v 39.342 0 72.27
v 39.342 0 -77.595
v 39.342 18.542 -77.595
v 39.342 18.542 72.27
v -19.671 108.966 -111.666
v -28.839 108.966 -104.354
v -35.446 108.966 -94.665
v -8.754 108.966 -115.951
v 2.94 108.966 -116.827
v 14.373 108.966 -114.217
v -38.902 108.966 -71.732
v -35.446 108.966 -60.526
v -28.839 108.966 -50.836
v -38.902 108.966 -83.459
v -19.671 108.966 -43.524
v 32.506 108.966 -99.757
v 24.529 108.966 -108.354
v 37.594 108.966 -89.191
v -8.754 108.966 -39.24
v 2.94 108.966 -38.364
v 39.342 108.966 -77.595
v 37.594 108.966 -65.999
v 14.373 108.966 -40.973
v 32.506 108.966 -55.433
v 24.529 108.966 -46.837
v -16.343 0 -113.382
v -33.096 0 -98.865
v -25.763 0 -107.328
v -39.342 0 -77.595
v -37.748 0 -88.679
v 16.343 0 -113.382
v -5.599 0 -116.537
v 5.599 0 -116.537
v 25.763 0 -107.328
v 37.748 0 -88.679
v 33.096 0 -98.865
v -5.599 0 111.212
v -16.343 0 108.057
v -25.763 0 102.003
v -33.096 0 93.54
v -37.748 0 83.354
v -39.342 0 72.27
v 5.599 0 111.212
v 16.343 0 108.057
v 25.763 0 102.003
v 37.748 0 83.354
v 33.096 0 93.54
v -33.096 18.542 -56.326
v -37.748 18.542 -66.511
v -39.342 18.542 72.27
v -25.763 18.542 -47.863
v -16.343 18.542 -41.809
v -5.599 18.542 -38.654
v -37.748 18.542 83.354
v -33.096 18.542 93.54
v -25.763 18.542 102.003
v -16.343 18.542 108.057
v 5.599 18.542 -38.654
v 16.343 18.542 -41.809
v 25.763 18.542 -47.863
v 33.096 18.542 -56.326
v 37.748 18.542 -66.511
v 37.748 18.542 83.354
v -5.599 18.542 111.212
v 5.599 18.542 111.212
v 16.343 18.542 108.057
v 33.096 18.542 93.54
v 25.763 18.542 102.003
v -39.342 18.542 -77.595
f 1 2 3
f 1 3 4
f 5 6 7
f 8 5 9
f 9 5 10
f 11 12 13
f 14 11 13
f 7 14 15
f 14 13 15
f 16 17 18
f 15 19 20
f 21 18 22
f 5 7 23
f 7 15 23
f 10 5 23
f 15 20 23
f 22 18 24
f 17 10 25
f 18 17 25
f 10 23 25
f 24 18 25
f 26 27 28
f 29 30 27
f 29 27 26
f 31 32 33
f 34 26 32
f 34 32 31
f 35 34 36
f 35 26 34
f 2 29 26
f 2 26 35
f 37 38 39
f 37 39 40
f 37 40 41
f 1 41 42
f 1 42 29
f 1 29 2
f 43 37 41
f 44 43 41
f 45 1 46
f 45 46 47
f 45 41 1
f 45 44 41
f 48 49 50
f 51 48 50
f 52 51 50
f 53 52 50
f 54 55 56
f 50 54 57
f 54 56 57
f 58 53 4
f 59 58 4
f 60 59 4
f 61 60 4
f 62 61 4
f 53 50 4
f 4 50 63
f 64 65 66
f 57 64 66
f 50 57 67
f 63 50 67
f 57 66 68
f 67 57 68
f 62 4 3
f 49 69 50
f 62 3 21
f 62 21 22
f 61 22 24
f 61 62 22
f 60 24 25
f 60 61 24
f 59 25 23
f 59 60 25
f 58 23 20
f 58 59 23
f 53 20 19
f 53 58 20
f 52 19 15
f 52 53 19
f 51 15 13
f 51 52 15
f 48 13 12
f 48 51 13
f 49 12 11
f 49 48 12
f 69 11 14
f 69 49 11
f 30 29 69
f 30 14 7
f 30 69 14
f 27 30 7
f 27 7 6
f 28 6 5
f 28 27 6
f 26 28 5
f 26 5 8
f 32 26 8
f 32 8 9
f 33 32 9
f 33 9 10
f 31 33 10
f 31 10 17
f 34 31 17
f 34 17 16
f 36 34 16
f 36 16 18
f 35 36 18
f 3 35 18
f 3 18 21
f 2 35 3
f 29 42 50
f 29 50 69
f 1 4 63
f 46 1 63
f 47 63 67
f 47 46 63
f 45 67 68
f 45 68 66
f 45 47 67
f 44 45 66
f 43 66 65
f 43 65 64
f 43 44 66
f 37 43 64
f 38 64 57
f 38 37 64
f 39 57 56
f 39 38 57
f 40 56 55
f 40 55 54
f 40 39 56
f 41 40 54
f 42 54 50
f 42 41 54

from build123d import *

# Parameters (mm, degrees)
F1_DEPTH = 108.966
F2_DEPTH = 18.542


with BuildPart() as f1:
    # F0 (on Front) → F1 (new body)
    with BuildSketch(Plane.XZ):
        with BuildLine():
            ThreePointArc((-39.341677, -77.595275), (0, -116.936952), (39.341677, -77.595275))
            Line((39.341677, -77.595275), (-39.341677, -77.595275))
        make_face()
        with BuildLine():
            Line((-39.341677, -77.595275), (39.341677, -77.595275))
            ThreePointArc((39.341677, -77.595275), (0, -38.253598), (-39.341677, -77.595275))
        make_face()
    extrude(amount=-F1_DEPTH)

    # F0 (on Front) → F2 (join)
    with BuildSketch(Plane.XZ):
        with BuildLine():
            Line((39.341677, -77.595275), (39.341677, 72.270408))
            ThreePointArc((39.341677, 72.270408), (0, 32.928731), (-39.341677, 72.270408))
            Line((-39.341677, 72.270408), (-39.341677, -77.595275))
            ThreePointArc((-39.341677, -77.595275), (0, -38.253598), (39.341677, -77.595275))
        make_face()
        with BuildLine():
            ThreePointArc((-39.341677, 72.270408), (0, 32.928731), (39.341677, 72.270408))
            Line((39.341677, 72.270408), (-39.341677, 72.270408))
        make_face()
        with BuildLine():
            Line((-39.341677, 72.270408), (39.341677, 72.270408))
            ThreePointArc((39.341677, 72.270408), (0, 111.612085), (-39.341677, 72.270408))
        make_face()
    extrude(amount=-F2_DEPTH)


solid = f1.part
